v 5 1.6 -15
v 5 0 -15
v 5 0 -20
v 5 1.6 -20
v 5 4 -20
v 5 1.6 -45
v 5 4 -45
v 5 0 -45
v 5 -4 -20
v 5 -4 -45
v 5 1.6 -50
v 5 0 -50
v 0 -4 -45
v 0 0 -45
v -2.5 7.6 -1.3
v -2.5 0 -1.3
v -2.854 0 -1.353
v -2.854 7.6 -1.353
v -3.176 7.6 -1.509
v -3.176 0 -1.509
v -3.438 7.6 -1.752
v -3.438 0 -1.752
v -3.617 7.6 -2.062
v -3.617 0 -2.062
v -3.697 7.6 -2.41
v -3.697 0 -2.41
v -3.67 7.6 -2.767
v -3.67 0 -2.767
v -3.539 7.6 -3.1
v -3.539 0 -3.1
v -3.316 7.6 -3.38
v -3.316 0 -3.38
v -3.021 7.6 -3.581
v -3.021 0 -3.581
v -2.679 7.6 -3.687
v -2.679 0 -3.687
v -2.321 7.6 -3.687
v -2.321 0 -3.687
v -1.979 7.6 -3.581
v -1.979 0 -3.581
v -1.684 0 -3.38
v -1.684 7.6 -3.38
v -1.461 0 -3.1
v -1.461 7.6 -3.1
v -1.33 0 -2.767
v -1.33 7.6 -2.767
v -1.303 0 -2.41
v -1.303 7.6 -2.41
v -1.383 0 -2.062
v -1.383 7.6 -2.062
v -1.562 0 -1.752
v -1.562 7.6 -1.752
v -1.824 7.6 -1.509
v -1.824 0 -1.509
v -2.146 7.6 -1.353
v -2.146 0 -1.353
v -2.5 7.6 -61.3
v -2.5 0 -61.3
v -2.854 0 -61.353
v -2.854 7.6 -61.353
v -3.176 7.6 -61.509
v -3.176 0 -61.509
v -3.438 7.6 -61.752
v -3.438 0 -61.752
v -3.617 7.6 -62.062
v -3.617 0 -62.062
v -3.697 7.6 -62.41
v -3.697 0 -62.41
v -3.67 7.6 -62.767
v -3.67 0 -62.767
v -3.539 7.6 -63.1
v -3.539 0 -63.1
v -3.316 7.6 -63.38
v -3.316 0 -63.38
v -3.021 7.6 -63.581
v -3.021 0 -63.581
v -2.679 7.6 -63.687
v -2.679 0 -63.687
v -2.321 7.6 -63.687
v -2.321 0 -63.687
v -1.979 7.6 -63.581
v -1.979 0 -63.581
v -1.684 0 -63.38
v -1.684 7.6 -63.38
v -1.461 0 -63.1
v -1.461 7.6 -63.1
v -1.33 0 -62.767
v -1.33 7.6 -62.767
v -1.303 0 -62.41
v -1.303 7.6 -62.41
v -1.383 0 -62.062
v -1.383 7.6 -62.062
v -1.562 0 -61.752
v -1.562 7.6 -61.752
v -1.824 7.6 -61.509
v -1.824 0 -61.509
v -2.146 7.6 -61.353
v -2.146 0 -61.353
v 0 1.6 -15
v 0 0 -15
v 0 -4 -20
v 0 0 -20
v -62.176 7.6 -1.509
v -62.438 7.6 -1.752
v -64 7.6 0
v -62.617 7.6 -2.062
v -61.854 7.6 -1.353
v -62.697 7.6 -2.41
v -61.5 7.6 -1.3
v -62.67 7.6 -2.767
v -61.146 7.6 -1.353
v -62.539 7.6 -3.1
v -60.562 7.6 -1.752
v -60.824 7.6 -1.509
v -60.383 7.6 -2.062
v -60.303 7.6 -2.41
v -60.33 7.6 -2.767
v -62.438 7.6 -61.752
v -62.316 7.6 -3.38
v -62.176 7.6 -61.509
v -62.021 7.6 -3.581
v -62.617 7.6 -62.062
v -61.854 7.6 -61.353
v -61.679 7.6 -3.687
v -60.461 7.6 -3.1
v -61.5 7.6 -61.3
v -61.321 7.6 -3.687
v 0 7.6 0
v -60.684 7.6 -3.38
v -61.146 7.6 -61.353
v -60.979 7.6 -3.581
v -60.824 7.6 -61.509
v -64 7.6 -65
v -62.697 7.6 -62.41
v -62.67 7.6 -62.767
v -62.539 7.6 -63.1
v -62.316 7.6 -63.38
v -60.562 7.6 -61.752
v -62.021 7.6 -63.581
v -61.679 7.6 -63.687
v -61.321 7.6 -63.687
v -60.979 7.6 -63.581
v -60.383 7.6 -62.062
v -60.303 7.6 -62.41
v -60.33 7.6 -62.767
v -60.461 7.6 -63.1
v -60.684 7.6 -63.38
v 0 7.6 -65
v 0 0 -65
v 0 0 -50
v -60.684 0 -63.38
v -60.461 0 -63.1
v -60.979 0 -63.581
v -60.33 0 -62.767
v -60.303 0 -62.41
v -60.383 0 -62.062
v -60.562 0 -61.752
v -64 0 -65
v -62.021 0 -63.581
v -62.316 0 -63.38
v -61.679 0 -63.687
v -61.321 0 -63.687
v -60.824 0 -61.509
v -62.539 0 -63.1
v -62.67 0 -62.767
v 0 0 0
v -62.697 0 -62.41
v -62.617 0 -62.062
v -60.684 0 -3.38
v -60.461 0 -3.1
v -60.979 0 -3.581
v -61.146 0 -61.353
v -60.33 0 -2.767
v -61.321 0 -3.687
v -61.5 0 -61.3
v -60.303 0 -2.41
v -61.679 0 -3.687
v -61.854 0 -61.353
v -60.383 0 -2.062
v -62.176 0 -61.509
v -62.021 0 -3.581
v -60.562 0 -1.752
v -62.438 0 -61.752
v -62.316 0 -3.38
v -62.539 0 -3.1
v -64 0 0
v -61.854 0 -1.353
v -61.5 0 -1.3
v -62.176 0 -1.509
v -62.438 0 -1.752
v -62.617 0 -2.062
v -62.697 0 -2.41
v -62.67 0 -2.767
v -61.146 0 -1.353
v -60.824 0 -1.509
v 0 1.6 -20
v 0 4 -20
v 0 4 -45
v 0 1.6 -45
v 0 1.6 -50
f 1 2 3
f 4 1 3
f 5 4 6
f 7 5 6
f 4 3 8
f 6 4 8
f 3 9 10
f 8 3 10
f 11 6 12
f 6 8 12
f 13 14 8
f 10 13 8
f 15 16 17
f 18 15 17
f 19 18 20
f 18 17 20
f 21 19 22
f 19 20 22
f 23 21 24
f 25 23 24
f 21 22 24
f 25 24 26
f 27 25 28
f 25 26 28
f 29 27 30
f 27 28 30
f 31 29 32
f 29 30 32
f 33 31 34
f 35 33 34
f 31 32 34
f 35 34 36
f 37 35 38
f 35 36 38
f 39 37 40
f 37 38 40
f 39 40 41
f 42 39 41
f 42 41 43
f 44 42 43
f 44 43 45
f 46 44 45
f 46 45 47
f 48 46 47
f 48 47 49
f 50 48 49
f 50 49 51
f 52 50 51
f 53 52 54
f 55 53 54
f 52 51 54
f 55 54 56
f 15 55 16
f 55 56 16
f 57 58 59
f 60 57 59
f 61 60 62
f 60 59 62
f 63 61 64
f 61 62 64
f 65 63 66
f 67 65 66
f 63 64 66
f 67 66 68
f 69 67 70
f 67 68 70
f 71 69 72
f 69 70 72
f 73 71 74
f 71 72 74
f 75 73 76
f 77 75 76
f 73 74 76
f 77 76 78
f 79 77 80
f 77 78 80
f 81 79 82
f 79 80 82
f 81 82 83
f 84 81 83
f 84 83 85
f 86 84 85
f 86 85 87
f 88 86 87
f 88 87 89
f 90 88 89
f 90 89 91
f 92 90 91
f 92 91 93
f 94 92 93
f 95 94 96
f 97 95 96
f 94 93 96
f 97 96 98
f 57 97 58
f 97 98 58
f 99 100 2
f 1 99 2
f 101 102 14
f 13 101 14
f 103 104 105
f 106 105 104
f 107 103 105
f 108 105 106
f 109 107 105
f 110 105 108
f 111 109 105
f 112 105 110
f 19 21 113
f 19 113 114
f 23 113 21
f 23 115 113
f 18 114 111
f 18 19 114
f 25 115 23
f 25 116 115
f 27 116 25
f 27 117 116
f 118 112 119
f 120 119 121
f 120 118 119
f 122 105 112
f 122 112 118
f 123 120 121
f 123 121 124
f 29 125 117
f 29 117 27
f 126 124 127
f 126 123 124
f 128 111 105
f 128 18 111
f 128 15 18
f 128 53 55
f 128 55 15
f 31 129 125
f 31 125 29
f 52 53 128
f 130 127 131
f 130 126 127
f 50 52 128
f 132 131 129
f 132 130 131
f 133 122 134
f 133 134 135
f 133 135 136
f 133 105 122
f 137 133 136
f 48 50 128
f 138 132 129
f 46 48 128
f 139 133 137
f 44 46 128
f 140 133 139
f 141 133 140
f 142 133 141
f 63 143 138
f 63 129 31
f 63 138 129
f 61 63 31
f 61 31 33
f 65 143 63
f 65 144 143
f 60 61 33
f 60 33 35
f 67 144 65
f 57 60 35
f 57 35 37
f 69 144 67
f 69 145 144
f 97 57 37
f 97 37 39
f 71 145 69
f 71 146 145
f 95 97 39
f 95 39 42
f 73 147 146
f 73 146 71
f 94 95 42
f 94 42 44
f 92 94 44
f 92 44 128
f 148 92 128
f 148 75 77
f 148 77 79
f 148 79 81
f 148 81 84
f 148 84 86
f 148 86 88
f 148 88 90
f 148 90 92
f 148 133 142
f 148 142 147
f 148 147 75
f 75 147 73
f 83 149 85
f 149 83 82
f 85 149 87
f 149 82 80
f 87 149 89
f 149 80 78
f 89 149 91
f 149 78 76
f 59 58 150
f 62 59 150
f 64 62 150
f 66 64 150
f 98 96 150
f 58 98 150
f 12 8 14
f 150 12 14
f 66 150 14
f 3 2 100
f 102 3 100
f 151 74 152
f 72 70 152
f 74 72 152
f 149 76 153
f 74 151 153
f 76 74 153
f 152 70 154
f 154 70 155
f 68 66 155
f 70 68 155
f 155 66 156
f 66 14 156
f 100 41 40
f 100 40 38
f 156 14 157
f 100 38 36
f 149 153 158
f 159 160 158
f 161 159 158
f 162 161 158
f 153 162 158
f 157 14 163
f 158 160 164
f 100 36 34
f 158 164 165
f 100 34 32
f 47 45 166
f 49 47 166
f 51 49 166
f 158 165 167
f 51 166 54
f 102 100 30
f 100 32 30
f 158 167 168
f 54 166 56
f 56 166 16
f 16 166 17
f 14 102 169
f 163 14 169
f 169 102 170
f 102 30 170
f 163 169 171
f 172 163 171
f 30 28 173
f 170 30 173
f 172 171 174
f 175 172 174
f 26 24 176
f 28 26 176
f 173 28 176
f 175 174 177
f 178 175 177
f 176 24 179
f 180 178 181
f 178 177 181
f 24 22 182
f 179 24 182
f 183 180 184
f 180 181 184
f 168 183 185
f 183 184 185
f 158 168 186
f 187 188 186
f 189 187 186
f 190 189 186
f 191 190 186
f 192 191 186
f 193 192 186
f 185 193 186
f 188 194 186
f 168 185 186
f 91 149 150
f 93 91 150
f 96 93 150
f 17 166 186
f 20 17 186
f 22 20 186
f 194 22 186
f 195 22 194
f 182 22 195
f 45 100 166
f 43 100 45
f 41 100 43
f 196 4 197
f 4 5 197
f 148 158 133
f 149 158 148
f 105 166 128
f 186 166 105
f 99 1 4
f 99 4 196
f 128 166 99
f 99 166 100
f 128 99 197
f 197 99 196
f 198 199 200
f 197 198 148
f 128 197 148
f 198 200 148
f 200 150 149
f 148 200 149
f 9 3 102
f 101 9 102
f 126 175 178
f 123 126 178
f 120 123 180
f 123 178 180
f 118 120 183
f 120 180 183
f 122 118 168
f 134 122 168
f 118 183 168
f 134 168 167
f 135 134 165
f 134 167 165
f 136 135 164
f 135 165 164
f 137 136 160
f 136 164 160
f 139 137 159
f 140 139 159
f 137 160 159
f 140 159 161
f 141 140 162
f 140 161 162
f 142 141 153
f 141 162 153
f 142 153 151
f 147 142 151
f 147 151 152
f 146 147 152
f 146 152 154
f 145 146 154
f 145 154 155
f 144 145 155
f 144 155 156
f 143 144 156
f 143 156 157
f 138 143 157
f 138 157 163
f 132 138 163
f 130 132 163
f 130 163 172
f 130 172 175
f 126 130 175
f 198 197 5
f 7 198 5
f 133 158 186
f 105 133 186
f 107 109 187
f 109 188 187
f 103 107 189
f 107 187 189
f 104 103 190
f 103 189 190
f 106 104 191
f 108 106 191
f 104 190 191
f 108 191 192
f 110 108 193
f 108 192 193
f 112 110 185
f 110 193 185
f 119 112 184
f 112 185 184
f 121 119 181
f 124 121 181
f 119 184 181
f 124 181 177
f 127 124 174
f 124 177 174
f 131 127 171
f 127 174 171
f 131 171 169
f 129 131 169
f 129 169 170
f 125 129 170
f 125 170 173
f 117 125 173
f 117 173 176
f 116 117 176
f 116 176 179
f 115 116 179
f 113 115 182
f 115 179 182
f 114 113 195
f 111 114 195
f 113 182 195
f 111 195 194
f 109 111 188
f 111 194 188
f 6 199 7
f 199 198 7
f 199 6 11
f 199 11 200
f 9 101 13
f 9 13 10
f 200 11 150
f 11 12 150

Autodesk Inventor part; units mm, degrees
ref_plane "YZ Plane" through (0, 0, 0) normal (1, 0, 0) x (0, 1, 0)
ref_plane "XZ Plane" through (0, 0, 0) normal (0, 1, 0) x (-1, 0, 0)
sketch "Sketch1" plane through (0, 0, 0) normal (0, 1, 0) x (-1, 0, 0)
  line L0 (0, 0) -> (64, 0)
  line L1 (64, 0) -> (64, -65)
  line L2 (64, -65) -> (0, -65)
  line L3 (0, -65) -> (0, 0)
  line L4 (0, -15) -> (-5, -15)
  line L5 (-5, -15) -> (-5, -50)
  line L6 (-5, -50) -> (0, -50)
  line L7 (0, -50) -> (0, -15)
  dimension "d0" = 64
  dimension "d1" = 65
  dimension "d2" = 5
  dimension "d3" = 15
  dimension "d4" = 15
extrude "Extrusion1" add sketch "Sketch1" along normal blind 1.6
sketch "Sketch2" plane through (0, 0, 0) normal (0, -1, 0) x (1, 0, 0)
  line L0 (5, -15) -> (5, -50) projected
  line L1 (5, -20) -> (0, -20)
  line L2 (0, -20) -> (0, -45)
  line L3 (0, -45) -> (5, -45)
  line L4 (5, -45) -> (5, -20)
  point P0 (0, 0)
  point P1 (5, -32.5)
  dimension "d7" = 5
  dimension "d8" = 25
extrude "Extrusion2" add sketch "Sketch2" along normal mid plane 8
sketch "Sketch3" plane through (0, 1.6, 0) normal (0, 1, 0) x (1, 0, 0)
  line L0 (0, 0) -> (0, 15) projected
  line L1 (-64, 65) -> (-64, 0) projected
  line L2 (0, 0) -> (-64, 0)
  line L3 (-64, 0) -> (-64, 65)
  line L4 (-64, 65) -> (0, 65)
  line L5 (0, 65) -> (0, 0)
extrude "Extrusion3" add sketch "Sketch3" along normal blind 6
sketch "Sketch4" plane through (0, 7.6, 0) normal (0, 1, 0) x (1, 0, 0)
  line L0 (-64, 0) -> (0, 0) projected
  line L1 (-64, 65) -> (-64, 0) projected
  point P0 (-61.5, 2.5)
  point P1 (-2.5, 2.5)
  point P2 (-61.5, 62.5)
  point P3 (-2.5, 62.5)
  dimension "d13" = 2.5
  dimension "d14" = 2.5
  dimension "d17" = 59
  dimension "d20" = 60
hole "Hole1" at (-61.5, 7.6, -2.5) at (-2.5, 7.6, -2.5) at (-61.5, 7.6, -62.5) at (-2.5, 7.6, -62.5) direction (0, -1, 0) diameter 2.4 end through all clearance for "Flat Head Machine Screw" size "M2" standard "Ansi Metric M Profile"
ref_plane "Work Plane1" through (-64, 0, -32.5) normal (0, 0, 1) x (1, 0, 0)
properties part number "Keypad"
